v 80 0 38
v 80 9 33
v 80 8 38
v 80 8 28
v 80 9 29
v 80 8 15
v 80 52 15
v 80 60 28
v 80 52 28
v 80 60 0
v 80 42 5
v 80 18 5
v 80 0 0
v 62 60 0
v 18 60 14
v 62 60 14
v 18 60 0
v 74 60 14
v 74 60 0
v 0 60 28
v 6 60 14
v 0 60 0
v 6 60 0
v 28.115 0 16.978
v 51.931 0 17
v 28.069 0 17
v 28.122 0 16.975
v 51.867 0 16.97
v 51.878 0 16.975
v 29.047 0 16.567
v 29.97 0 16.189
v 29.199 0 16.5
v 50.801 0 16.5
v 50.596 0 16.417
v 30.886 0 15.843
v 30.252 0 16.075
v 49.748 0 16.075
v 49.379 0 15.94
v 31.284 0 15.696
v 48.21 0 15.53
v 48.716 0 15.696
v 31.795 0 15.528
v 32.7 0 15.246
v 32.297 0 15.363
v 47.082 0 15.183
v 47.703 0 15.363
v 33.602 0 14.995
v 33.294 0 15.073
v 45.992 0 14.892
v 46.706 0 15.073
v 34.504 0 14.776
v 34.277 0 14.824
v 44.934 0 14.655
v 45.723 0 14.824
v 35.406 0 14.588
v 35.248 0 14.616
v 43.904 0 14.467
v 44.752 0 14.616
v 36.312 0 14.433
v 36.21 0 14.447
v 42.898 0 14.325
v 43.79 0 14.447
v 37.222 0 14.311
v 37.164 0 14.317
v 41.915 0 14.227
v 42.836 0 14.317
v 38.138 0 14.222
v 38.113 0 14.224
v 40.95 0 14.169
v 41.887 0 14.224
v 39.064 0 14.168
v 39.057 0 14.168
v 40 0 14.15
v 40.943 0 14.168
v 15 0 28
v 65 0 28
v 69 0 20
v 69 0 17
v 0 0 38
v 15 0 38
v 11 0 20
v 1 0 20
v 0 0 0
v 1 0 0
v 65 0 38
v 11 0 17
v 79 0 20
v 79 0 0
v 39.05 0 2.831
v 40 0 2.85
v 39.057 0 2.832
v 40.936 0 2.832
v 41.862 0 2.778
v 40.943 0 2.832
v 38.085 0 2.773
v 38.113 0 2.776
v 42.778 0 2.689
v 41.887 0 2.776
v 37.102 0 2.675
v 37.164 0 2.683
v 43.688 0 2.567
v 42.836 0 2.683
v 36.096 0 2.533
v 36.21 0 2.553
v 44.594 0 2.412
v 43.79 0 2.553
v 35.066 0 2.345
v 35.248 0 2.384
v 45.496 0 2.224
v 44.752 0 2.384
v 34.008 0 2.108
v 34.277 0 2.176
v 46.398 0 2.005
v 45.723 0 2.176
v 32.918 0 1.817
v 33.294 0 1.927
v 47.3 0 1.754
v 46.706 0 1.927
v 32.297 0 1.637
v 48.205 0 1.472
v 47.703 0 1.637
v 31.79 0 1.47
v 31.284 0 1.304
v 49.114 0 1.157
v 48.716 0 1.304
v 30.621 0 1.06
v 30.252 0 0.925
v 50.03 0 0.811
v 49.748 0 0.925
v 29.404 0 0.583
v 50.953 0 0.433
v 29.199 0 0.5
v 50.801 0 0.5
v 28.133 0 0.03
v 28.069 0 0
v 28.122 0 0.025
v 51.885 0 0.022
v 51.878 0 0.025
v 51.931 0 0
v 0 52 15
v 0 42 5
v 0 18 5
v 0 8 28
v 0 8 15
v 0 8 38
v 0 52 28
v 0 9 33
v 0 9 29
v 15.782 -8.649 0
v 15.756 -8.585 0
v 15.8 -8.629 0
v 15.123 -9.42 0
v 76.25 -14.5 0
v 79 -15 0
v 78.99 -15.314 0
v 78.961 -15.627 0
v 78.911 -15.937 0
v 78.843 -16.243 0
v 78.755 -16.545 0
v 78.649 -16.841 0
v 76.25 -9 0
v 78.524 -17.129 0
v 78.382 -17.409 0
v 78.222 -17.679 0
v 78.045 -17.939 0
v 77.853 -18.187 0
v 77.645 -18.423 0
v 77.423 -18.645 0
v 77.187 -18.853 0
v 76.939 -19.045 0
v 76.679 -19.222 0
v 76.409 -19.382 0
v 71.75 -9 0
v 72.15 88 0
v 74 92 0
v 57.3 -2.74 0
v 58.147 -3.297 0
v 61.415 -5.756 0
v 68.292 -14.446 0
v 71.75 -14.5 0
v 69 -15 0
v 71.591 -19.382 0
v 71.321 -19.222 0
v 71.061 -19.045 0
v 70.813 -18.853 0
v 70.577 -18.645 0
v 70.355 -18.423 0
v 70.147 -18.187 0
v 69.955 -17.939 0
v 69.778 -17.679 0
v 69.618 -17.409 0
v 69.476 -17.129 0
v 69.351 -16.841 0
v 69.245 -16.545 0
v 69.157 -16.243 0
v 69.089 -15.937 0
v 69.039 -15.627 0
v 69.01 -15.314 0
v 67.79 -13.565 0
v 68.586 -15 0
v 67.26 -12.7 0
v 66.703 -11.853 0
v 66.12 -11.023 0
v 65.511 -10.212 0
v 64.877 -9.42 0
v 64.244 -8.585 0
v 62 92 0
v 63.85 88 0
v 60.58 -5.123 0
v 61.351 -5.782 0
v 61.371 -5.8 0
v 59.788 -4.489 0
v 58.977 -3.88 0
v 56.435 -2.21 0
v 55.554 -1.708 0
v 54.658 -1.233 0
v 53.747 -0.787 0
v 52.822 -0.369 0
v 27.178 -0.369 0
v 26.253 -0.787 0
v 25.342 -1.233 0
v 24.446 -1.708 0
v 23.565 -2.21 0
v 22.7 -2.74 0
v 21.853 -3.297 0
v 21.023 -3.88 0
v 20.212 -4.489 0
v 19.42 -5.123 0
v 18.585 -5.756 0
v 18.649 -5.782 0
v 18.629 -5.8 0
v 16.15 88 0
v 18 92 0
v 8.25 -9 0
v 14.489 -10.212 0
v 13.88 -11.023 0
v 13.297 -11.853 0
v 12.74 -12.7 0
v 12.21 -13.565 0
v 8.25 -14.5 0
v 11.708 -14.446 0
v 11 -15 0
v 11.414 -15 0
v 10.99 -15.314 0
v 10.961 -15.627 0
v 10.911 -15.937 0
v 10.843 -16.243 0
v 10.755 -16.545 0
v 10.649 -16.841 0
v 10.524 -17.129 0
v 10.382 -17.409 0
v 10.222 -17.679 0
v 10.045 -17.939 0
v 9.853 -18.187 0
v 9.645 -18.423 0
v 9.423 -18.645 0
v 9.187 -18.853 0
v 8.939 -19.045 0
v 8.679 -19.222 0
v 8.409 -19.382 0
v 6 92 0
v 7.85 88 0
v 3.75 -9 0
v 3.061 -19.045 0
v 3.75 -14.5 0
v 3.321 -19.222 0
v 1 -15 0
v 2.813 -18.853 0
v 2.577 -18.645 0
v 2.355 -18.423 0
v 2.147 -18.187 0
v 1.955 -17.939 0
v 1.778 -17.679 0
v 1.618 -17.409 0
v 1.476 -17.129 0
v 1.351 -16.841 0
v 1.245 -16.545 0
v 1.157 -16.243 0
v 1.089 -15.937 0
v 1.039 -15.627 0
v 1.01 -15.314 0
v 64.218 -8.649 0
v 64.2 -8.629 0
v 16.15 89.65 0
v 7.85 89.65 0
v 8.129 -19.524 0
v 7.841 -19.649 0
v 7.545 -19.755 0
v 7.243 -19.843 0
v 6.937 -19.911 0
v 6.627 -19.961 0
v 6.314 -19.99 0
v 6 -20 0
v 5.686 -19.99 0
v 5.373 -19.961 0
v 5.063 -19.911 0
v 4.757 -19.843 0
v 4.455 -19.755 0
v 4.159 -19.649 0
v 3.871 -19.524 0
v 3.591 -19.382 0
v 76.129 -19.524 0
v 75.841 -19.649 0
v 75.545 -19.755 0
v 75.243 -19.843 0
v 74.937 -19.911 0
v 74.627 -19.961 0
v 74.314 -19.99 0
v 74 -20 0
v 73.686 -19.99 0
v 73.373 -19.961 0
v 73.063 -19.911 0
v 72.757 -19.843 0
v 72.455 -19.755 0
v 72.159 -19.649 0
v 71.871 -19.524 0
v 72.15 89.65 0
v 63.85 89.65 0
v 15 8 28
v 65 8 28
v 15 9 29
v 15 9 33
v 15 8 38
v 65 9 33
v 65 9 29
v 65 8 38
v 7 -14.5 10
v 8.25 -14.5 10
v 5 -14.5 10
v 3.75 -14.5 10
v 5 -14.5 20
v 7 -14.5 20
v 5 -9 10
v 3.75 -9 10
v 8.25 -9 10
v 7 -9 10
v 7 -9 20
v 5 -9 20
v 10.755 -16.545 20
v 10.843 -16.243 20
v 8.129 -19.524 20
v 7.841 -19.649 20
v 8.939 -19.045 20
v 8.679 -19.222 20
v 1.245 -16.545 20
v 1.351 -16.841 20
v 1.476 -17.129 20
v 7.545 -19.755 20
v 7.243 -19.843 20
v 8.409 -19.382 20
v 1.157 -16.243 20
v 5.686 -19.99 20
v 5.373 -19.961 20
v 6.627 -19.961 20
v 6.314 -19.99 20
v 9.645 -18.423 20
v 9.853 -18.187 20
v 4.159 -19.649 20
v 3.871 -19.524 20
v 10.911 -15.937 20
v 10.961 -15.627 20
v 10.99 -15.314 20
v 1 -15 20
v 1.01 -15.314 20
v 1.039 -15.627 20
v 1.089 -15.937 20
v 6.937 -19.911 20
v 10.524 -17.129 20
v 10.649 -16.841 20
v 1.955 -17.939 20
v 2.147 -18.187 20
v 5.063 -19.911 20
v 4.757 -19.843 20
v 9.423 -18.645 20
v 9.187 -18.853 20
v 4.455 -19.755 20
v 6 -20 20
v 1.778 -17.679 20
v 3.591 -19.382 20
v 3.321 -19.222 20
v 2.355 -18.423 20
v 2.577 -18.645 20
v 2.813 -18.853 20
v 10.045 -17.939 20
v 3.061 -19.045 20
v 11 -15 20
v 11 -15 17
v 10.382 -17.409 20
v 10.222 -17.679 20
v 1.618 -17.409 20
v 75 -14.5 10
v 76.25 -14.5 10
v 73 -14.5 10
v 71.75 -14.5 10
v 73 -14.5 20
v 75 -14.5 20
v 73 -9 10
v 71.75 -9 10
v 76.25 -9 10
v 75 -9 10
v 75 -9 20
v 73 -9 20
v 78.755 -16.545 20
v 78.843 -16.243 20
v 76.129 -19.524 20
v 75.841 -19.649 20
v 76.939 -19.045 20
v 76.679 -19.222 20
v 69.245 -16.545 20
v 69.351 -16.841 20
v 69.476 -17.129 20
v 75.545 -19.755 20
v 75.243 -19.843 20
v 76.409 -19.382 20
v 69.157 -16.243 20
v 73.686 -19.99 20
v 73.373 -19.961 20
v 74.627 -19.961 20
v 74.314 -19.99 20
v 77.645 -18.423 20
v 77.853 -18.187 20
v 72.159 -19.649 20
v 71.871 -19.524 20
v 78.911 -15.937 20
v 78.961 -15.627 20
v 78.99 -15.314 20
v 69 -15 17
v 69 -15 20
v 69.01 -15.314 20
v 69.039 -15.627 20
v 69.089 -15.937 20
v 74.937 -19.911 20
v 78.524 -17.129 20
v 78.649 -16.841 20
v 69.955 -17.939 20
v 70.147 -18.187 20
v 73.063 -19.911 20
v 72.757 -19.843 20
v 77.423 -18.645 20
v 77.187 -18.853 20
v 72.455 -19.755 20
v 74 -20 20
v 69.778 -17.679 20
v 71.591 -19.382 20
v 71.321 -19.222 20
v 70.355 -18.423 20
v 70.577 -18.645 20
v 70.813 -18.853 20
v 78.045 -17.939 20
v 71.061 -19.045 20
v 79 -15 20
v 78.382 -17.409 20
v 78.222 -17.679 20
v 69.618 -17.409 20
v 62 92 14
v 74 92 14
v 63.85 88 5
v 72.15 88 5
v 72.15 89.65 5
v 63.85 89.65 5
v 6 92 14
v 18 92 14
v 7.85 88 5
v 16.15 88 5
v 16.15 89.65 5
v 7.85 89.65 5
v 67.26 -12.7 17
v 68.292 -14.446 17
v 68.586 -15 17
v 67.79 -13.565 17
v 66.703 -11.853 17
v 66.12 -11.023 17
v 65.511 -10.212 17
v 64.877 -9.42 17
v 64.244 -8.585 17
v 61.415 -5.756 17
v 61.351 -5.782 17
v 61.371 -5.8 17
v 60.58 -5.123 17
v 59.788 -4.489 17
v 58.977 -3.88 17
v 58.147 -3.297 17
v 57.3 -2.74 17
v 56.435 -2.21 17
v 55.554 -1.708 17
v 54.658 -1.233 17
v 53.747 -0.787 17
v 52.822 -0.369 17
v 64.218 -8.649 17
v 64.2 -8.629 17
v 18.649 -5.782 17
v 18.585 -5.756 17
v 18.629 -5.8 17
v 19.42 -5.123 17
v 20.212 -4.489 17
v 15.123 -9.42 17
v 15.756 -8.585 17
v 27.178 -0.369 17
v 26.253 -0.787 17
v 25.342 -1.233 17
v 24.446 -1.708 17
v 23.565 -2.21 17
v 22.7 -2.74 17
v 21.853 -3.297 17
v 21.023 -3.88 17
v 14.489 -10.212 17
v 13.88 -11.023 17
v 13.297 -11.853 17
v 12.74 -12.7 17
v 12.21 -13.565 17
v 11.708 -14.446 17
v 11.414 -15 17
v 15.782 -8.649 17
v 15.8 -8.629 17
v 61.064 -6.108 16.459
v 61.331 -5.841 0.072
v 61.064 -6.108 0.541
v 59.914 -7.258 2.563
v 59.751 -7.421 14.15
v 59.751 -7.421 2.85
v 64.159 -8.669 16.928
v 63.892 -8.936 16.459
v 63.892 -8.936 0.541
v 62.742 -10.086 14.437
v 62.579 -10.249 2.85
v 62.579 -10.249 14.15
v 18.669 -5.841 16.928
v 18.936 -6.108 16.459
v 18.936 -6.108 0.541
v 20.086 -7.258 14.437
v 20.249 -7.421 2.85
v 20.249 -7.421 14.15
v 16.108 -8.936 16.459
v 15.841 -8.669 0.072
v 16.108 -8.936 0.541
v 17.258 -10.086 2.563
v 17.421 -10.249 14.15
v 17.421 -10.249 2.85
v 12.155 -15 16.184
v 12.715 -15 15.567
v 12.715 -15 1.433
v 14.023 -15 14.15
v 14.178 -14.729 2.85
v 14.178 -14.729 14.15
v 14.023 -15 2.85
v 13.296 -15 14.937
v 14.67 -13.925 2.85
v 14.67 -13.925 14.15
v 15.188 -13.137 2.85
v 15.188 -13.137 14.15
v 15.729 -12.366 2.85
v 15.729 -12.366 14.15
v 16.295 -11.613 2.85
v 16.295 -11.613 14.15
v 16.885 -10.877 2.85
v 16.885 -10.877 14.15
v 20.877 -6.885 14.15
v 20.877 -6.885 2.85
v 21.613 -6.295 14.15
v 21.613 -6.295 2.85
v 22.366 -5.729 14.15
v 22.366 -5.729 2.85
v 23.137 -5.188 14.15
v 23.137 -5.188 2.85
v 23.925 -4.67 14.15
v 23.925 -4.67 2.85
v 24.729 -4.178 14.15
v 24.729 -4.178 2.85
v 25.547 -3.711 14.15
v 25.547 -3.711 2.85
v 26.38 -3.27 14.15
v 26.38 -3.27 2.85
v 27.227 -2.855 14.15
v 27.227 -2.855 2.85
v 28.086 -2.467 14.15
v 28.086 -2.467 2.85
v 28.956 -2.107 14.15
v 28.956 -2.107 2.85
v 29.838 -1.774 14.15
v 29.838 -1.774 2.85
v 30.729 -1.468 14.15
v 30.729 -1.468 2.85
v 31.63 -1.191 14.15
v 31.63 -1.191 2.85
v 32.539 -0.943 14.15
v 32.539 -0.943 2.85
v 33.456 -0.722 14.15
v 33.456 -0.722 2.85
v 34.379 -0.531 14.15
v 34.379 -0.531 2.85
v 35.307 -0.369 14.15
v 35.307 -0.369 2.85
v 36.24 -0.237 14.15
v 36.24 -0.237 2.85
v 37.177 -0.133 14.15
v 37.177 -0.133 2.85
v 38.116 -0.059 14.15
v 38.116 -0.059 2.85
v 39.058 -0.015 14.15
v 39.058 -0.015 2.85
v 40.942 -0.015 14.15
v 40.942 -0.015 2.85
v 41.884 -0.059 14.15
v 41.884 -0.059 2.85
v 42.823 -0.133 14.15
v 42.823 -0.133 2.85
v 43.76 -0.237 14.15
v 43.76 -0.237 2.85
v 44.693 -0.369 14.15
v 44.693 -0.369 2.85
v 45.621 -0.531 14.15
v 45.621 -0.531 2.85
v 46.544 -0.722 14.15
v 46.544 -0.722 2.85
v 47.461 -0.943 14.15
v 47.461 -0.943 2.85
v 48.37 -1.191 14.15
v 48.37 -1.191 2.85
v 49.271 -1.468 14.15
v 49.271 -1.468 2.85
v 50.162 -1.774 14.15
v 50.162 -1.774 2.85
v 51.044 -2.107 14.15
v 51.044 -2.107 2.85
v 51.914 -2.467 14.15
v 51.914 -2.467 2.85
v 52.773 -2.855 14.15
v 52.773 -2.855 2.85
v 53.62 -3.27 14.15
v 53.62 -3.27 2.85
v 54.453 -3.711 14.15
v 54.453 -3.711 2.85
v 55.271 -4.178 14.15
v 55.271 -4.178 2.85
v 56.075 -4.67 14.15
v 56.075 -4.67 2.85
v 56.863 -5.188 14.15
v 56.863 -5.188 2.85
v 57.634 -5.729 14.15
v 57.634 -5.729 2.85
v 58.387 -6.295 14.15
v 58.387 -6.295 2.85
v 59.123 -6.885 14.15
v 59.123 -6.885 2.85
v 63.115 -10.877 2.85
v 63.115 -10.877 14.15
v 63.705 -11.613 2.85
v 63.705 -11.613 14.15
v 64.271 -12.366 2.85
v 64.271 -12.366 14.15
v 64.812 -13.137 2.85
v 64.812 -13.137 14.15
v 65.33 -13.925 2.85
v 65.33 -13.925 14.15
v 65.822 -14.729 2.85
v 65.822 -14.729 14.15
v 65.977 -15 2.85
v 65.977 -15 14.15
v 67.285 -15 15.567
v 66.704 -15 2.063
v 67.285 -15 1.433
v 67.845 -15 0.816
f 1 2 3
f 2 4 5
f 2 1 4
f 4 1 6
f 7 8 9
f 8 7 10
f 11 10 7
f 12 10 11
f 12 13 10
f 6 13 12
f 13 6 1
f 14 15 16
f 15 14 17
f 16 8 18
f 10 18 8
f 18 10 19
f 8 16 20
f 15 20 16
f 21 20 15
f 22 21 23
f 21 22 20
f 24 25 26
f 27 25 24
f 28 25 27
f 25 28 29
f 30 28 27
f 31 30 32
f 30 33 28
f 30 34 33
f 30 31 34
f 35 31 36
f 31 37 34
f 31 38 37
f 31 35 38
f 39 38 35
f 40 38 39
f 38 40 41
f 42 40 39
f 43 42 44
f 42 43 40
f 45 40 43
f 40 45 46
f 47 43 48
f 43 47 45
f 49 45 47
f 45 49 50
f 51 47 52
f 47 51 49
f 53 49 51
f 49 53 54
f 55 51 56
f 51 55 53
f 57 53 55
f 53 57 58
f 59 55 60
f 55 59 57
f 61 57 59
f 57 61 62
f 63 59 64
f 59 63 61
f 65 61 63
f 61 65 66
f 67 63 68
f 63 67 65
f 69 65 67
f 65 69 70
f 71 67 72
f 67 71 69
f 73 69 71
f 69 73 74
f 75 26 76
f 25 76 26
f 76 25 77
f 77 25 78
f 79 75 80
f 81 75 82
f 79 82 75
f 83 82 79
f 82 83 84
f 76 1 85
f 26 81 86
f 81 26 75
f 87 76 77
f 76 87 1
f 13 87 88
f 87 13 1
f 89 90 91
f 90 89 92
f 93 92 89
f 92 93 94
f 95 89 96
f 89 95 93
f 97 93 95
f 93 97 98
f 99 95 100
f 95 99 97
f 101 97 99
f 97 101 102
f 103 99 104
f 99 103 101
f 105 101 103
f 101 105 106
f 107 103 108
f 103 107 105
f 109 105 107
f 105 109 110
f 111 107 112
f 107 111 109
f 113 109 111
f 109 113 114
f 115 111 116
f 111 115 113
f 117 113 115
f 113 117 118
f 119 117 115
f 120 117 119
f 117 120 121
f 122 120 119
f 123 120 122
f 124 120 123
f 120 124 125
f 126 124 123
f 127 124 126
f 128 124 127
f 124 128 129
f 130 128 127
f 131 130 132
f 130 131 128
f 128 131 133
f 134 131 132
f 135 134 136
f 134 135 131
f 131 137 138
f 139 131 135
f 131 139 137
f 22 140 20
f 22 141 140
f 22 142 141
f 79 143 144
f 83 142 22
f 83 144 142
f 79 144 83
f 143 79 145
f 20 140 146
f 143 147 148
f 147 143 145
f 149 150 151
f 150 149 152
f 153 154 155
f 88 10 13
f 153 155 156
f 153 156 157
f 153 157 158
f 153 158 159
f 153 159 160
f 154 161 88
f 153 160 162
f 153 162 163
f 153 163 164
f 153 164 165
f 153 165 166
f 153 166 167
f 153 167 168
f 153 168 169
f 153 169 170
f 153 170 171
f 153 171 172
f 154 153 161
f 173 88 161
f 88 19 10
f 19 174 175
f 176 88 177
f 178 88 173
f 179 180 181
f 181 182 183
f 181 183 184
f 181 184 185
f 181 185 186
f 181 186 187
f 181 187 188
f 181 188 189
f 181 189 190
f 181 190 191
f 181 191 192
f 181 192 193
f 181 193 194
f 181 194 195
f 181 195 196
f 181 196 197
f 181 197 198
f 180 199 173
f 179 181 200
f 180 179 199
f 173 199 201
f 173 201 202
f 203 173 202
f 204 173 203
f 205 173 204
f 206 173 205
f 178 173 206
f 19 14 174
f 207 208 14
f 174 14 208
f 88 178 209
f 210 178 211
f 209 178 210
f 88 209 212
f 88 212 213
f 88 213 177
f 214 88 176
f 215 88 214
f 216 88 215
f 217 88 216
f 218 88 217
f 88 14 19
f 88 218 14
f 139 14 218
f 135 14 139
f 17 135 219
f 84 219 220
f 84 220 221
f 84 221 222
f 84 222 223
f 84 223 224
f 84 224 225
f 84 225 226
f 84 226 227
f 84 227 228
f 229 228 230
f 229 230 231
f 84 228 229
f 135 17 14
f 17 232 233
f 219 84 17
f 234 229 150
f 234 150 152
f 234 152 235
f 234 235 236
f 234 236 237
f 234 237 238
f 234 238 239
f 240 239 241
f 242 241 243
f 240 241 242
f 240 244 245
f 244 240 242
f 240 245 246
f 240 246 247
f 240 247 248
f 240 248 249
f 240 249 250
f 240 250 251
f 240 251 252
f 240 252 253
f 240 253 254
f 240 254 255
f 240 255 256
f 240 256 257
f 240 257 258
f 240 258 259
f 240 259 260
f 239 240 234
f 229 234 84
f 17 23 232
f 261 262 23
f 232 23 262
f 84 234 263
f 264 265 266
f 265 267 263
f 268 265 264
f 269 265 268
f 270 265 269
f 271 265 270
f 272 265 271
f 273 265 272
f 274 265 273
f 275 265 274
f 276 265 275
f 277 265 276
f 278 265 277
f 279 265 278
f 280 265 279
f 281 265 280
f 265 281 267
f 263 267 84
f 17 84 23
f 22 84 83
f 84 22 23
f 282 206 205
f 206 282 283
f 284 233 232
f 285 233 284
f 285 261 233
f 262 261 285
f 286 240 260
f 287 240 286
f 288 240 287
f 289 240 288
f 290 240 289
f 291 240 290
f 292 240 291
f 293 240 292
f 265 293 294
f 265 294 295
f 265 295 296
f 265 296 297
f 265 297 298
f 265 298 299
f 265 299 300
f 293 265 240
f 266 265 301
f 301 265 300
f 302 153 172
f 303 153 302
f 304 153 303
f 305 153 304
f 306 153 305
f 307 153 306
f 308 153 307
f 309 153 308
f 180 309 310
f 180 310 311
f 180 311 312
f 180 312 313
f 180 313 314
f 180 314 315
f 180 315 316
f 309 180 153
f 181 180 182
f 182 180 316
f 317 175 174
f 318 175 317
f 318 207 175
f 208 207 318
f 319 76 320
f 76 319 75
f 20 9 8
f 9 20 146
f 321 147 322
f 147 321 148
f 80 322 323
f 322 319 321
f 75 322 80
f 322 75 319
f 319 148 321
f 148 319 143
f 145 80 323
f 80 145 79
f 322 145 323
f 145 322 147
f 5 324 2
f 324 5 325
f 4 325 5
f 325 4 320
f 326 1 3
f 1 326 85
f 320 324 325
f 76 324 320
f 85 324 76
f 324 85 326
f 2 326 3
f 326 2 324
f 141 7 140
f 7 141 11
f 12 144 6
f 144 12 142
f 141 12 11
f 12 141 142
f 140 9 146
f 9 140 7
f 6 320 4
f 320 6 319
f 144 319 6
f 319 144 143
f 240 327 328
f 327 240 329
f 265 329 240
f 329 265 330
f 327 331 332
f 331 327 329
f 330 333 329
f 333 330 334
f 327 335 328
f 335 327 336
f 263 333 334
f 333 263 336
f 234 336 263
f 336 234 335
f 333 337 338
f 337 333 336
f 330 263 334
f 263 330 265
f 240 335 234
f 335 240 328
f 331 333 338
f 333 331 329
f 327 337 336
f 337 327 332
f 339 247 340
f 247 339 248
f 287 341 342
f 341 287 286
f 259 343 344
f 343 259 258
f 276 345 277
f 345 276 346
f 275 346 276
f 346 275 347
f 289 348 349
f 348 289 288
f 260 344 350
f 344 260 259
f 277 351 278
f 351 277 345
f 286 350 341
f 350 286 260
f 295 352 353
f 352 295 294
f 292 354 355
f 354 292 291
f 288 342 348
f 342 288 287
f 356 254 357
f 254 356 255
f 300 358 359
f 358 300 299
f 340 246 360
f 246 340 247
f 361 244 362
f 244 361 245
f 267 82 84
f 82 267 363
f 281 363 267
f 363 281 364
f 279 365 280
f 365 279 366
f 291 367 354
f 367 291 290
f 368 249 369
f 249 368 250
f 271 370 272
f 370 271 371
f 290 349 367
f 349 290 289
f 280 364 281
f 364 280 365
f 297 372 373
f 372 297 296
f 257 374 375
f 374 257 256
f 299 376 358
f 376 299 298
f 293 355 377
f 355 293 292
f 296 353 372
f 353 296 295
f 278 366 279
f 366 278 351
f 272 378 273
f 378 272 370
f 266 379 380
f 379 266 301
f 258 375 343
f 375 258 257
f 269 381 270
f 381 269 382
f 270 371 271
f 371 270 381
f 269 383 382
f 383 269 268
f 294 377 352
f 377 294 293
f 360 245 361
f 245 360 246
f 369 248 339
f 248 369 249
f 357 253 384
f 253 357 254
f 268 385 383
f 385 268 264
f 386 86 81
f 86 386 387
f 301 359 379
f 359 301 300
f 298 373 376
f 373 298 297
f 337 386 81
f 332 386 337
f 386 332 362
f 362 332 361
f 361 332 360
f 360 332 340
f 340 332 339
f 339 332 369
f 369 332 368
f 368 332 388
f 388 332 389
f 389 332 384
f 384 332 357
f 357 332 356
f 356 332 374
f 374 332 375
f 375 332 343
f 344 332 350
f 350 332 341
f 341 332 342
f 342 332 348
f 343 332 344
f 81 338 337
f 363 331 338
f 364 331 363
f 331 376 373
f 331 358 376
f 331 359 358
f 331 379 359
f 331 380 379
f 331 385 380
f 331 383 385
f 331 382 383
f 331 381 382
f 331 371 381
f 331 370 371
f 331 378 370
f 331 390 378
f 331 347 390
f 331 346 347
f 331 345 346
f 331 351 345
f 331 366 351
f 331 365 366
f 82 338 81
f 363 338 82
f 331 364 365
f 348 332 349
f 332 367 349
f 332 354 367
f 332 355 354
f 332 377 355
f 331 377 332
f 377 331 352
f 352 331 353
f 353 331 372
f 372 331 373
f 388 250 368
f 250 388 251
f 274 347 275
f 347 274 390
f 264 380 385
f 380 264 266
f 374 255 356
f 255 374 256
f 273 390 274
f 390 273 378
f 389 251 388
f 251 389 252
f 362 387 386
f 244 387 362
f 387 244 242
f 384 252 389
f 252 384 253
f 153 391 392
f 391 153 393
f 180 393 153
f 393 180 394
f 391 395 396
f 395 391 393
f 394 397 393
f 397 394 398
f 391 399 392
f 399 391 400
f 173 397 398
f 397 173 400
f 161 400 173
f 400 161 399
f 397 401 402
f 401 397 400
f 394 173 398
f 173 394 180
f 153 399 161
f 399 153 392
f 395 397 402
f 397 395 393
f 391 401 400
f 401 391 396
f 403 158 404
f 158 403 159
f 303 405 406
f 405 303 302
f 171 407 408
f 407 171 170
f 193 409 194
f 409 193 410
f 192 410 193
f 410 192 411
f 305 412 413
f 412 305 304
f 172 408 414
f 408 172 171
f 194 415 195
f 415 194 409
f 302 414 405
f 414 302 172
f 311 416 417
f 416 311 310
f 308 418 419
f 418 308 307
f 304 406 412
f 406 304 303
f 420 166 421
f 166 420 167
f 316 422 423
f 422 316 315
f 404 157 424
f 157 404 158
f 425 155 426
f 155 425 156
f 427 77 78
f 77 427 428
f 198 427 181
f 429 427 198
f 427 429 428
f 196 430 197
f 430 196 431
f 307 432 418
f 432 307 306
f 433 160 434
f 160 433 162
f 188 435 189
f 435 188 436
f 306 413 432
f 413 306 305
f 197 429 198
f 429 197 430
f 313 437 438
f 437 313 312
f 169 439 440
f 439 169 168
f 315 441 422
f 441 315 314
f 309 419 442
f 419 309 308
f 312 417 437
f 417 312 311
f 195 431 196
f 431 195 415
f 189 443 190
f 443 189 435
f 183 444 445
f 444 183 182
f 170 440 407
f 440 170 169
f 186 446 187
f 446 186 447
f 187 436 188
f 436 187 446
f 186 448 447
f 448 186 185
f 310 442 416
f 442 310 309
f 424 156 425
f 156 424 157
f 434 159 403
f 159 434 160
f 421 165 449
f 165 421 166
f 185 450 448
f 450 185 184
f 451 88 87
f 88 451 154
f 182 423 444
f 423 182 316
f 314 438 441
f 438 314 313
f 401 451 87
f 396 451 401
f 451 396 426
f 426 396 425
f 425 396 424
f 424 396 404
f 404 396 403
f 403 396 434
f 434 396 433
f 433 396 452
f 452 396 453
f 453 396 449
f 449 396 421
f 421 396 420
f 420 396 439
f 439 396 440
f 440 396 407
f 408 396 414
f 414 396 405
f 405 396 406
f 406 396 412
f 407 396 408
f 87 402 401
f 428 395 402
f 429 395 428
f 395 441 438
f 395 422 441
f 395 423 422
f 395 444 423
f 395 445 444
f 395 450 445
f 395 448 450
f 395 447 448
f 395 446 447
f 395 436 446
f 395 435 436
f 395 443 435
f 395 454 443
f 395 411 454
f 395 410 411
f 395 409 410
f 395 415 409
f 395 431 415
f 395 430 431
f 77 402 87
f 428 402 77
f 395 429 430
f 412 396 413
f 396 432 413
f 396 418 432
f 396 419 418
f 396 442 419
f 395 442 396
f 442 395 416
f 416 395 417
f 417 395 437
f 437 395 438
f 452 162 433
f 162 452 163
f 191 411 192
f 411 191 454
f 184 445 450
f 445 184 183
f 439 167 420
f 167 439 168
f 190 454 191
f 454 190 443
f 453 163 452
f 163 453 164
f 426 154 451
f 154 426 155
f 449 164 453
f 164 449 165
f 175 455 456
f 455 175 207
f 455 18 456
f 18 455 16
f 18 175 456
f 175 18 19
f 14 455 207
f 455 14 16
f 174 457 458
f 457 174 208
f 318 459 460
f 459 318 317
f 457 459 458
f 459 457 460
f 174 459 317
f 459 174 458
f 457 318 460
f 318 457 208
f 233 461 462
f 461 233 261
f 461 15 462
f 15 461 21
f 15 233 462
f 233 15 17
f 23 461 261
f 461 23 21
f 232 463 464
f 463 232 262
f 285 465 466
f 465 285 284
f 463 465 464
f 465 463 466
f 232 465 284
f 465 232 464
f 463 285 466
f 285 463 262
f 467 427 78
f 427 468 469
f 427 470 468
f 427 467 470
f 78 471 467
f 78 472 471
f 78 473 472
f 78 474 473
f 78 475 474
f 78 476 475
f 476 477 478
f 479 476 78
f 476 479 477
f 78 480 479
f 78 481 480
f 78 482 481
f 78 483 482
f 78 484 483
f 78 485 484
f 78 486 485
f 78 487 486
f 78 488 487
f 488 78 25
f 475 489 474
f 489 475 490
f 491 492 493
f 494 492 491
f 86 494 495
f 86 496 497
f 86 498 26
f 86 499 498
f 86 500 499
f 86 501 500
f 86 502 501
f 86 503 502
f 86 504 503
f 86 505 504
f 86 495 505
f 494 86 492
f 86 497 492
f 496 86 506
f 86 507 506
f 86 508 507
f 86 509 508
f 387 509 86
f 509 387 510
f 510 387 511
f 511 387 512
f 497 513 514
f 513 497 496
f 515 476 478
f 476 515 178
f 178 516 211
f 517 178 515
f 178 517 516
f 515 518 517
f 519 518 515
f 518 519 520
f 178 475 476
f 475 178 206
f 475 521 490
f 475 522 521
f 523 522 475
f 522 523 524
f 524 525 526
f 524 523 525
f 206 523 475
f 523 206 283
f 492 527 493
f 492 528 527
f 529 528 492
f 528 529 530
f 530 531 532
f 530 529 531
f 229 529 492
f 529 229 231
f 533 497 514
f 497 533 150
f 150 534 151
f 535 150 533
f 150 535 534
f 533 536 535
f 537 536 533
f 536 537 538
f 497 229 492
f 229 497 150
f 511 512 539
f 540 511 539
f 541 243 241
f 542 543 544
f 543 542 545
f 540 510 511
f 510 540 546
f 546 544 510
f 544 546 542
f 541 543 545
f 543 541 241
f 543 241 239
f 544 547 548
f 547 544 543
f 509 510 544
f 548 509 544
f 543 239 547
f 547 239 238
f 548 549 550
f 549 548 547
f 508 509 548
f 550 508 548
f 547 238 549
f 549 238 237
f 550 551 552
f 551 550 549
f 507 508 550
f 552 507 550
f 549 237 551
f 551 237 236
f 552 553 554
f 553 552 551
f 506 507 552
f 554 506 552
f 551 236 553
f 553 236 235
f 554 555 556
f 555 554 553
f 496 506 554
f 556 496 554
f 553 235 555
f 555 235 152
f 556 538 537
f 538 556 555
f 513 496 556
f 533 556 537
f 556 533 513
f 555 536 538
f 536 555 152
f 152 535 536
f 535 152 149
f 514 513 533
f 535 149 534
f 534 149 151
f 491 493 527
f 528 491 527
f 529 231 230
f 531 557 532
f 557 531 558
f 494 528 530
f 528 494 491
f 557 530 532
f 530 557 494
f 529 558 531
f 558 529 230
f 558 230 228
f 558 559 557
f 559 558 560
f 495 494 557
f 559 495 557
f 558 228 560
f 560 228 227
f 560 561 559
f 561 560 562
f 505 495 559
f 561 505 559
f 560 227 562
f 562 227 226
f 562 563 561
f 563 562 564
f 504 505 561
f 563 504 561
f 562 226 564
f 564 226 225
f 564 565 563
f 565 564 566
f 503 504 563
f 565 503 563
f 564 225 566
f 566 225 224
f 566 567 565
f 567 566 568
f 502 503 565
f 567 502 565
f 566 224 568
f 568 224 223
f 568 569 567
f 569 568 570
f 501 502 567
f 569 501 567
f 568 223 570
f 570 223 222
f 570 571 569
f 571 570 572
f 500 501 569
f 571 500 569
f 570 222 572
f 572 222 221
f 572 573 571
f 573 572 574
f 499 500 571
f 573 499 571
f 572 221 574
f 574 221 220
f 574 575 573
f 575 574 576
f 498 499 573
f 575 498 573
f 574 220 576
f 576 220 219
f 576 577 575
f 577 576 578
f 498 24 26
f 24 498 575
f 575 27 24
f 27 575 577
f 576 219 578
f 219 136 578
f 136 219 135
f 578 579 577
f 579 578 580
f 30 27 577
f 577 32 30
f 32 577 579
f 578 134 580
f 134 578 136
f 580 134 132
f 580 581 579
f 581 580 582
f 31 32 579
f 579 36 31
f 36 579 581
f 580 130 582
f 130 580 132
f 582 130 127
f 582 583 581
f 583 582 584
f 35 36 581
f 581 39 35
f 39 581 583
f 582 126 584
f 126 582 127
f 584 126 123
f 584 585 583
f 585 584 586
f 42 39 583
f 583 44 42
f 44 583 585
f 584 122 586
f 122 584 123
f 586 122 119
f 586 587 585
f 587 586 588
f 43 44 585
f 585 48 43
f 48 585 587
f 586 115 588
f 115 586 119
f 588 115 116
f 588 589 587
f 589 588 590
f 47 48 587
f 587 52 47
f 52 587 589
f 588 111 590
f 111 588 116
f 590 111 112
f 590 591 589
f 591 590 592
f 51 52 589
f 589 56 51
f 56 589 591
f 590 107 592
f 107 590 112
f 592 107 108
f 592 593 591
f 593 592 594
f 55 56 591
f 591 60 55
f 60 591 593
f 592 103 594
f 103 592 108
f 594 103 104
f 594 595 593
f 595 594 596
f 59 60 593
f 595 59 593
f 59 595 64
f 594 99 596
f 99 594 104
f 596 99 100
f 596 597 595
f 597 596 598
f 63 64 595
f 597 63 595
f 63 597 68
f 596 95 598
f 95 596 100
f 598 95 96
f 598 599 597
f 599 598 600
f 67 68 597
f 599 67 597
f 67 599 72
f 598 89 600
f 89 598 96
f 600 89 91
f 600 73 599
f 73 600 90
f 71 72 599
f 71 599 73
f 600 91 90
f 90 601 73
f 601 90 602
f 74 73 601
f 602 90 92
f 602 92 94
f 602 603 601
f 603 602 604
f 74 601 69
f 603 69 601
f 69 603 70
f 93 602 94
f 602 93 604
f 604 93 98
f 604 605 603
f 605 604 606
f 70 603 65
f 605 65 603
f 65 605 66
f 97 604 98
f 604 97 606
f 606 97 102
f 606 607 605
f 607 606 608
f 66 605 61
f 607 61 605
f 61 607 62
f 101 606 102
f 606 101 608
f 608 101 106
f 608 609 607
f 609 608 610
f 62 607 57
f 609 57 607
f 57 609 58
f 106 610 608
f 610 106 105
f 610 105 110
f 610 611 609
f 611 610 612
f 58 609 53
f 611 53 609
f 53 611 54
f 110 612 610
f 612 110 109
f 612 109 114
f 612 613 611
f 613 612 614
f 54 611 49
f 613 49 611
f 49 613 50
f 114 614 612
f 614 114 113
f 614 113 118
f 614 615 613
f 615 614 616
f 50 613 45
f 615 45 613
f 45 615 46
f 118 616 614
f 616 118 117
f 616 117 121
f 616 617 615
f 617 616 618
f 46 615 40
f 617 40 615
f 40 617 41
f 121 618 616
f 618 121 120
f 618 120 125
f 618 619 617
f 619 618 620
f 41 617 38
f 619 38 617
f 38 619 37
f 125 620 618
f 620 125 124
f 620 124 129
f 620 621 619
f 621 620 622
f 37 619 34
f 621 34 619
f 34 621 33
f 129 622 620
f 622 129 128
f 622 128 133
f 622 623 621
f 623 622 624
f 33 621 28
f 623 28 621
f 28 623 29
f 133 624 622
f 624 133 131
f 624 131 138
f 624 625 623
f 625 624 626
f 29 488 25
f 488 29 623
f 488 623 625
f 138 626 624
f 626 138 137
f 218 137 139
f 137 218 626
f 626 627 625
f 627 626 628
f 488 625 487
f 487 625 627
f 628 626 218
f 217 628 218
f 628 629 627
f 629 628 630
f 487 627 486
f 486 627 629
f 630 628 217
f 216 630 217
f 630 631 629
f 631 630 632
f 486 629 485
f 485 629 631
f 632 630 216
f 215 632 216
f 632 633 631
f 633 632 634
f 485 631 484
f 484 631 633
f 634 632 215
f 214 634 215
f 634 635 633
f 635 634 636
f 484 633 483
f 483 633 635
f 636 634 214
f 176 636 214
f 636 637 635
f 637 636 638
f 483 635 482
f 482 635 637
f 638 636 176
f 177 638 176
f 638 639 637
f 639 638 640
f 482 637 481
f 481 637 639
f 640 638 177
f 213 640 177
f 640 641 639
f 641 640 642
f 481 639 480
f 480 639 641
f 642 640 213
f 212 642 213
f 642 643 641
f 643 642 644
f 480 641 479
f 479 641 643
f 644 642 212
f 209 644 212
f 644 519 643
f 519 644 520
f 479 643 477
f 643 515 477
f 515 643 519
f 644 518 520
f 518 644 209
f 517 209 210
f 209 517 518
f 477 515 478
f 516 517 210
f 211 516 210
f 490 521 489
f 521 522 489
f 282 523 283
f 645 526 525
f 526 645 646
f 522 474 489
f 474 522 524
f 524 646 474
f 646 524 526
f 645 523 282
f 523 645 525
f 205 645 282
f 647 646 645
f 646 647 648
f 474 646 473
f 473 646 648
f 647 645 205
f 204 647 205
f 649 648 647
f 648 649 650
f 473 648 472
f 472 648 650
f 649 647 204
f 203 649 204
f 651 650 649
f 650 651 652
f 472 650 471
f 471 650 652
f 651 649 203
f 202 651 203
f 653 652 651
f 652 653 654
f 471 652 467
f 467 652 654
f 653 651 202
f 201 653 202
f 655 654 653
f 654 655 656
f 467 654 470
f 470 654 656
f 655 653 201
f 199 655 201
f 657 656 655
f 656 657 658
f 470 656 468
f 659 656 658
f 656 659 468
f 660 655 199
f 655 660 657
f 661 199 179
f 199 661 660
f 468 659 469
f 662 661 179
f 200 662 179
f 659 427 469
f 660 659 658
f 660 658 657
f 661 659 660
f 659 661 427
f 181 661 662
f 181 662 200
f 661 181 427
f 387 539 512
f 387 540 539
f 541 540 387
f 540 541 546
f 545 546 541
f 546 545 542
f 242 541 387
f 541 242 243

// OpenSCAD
$fn = 100;

module RobotMount (){
    difference() {
        union(){
            cube([80, 28, 60]);
            translate([0, 0, 0]){
                rotate([90, 0, 0]){
                    FrameClip();
                }
            }
            translate([65, 0, 0]){
                rotate([90, 0, 0]){
                    FrameClip();
                }
            }    
        }
        
        translate([-.5, 0, 8]){
            RobotFrame(81);
        }
    }
    
}

module RobotFrame(length){
    rotate([90, 0, 90]){
        linear_extrude(length) {
            polygon(
                points = [ [0, 0], [13, 0], [23, 10], [23, 34], [13, 44], [0, 44] ],
                paths = [[0, 1, 2, 3, 4, 5]]
            );
        }
    }
}

module CdSPhotoCell(){
    union(){
        cube([5.5, 4.5, 40]);
        translate([0, 1.25, -34]){
            cube([5.5, 2, 34]);
        }
    }
}

module FrameClip(){
    translate([0, 0, 10]){
        rotate([0, 90, 0]){
            linear_extrude(15){
                polygon(
                    points = [ [0, 0], [10, 0], [10, 8], [9, 9], [5, 9], [0, 8] ],
                    paths = [[0, 1, 2, 3, 4, 5]]
                );
            }
        }
    }
}

module CdSSocket(){
    difference(){
        hull(){
            translate([16, 5, 0]){
                cylinder(r=5, h = 20);
            }
            cube([10, 10, 20]);
        }
        translate([10, 7.25, 10]){
            rotate([180, 0, 0]){
                CdSPhotoCell();
            }
        }
    }
}

module IRSensorClip(){
    difference(){
        cube([14, 12, 34]);
        translate([9, 1.85, 2.35]){
            cube([5, 8.3, 1.65]);
        }
    }
}

module Fan(){
    difference(){
        cube([60, 60,25]);
        
        translate([0, 0, 3.5]){
            difference(){
                translate([-5, -5, 0]){
                    cube([70, 70, 17]);
                }
                translate([30, 30, 0]){
                    union(){
                        rotate_extrude($fn=200){
                                polygon(
                                    points = [ [0, 0], [0, 17], [32.286, 17], [30, 14.15], [30, 2.85], [32.286, 0] ]
                                );
                        }
                        translate([0, 0, 0]){
                            for(i = [0, 1, 2, 3]){
                                rotate([0, 0, (45+(i * 90))]){
                                    translate([-2, 29, 0]){
                                        cube([4, 3.286, 17]);
                                    }
                                }
                            }
                        }
                    }
                }
            }
        }
    }
}

module FanMount(){
    translate([0, 0, 0]){
        rotate([0, 0, 0]){
            difference(){
                cube([60, 15, 17]);
                
                translate([0, 0 , -3.5]){
                    Fan();
                }
            }
        }
    }
}

module FullMount(){
    union(){
        translate([0, 0, 28]){
            rotate([-90, 0, 0]){
                RobotMount();
            }
        }
        translate([1, 1, 0]){
            rotate([0, 0, -90]){
                CdSSocket(); 
            }
        }
        translate([69, 1, 0]){
            rotate([0, 0, -90]){
                CdSSocket(); 
            }
        }
        translate([62, 92, 14]){
            rotate([0, 90, -90]){
                IRSensorClip(); 
            }
        }
        translate([6, 92, 14]){
            rotate([0, 90, -90]){
                IRSensorClip(); 
            }
        }
        translate([70, 0, 0]){
            rotate([0, 0, 180]){
                FanMount();
            }
        }
    }
}

FullMount();
